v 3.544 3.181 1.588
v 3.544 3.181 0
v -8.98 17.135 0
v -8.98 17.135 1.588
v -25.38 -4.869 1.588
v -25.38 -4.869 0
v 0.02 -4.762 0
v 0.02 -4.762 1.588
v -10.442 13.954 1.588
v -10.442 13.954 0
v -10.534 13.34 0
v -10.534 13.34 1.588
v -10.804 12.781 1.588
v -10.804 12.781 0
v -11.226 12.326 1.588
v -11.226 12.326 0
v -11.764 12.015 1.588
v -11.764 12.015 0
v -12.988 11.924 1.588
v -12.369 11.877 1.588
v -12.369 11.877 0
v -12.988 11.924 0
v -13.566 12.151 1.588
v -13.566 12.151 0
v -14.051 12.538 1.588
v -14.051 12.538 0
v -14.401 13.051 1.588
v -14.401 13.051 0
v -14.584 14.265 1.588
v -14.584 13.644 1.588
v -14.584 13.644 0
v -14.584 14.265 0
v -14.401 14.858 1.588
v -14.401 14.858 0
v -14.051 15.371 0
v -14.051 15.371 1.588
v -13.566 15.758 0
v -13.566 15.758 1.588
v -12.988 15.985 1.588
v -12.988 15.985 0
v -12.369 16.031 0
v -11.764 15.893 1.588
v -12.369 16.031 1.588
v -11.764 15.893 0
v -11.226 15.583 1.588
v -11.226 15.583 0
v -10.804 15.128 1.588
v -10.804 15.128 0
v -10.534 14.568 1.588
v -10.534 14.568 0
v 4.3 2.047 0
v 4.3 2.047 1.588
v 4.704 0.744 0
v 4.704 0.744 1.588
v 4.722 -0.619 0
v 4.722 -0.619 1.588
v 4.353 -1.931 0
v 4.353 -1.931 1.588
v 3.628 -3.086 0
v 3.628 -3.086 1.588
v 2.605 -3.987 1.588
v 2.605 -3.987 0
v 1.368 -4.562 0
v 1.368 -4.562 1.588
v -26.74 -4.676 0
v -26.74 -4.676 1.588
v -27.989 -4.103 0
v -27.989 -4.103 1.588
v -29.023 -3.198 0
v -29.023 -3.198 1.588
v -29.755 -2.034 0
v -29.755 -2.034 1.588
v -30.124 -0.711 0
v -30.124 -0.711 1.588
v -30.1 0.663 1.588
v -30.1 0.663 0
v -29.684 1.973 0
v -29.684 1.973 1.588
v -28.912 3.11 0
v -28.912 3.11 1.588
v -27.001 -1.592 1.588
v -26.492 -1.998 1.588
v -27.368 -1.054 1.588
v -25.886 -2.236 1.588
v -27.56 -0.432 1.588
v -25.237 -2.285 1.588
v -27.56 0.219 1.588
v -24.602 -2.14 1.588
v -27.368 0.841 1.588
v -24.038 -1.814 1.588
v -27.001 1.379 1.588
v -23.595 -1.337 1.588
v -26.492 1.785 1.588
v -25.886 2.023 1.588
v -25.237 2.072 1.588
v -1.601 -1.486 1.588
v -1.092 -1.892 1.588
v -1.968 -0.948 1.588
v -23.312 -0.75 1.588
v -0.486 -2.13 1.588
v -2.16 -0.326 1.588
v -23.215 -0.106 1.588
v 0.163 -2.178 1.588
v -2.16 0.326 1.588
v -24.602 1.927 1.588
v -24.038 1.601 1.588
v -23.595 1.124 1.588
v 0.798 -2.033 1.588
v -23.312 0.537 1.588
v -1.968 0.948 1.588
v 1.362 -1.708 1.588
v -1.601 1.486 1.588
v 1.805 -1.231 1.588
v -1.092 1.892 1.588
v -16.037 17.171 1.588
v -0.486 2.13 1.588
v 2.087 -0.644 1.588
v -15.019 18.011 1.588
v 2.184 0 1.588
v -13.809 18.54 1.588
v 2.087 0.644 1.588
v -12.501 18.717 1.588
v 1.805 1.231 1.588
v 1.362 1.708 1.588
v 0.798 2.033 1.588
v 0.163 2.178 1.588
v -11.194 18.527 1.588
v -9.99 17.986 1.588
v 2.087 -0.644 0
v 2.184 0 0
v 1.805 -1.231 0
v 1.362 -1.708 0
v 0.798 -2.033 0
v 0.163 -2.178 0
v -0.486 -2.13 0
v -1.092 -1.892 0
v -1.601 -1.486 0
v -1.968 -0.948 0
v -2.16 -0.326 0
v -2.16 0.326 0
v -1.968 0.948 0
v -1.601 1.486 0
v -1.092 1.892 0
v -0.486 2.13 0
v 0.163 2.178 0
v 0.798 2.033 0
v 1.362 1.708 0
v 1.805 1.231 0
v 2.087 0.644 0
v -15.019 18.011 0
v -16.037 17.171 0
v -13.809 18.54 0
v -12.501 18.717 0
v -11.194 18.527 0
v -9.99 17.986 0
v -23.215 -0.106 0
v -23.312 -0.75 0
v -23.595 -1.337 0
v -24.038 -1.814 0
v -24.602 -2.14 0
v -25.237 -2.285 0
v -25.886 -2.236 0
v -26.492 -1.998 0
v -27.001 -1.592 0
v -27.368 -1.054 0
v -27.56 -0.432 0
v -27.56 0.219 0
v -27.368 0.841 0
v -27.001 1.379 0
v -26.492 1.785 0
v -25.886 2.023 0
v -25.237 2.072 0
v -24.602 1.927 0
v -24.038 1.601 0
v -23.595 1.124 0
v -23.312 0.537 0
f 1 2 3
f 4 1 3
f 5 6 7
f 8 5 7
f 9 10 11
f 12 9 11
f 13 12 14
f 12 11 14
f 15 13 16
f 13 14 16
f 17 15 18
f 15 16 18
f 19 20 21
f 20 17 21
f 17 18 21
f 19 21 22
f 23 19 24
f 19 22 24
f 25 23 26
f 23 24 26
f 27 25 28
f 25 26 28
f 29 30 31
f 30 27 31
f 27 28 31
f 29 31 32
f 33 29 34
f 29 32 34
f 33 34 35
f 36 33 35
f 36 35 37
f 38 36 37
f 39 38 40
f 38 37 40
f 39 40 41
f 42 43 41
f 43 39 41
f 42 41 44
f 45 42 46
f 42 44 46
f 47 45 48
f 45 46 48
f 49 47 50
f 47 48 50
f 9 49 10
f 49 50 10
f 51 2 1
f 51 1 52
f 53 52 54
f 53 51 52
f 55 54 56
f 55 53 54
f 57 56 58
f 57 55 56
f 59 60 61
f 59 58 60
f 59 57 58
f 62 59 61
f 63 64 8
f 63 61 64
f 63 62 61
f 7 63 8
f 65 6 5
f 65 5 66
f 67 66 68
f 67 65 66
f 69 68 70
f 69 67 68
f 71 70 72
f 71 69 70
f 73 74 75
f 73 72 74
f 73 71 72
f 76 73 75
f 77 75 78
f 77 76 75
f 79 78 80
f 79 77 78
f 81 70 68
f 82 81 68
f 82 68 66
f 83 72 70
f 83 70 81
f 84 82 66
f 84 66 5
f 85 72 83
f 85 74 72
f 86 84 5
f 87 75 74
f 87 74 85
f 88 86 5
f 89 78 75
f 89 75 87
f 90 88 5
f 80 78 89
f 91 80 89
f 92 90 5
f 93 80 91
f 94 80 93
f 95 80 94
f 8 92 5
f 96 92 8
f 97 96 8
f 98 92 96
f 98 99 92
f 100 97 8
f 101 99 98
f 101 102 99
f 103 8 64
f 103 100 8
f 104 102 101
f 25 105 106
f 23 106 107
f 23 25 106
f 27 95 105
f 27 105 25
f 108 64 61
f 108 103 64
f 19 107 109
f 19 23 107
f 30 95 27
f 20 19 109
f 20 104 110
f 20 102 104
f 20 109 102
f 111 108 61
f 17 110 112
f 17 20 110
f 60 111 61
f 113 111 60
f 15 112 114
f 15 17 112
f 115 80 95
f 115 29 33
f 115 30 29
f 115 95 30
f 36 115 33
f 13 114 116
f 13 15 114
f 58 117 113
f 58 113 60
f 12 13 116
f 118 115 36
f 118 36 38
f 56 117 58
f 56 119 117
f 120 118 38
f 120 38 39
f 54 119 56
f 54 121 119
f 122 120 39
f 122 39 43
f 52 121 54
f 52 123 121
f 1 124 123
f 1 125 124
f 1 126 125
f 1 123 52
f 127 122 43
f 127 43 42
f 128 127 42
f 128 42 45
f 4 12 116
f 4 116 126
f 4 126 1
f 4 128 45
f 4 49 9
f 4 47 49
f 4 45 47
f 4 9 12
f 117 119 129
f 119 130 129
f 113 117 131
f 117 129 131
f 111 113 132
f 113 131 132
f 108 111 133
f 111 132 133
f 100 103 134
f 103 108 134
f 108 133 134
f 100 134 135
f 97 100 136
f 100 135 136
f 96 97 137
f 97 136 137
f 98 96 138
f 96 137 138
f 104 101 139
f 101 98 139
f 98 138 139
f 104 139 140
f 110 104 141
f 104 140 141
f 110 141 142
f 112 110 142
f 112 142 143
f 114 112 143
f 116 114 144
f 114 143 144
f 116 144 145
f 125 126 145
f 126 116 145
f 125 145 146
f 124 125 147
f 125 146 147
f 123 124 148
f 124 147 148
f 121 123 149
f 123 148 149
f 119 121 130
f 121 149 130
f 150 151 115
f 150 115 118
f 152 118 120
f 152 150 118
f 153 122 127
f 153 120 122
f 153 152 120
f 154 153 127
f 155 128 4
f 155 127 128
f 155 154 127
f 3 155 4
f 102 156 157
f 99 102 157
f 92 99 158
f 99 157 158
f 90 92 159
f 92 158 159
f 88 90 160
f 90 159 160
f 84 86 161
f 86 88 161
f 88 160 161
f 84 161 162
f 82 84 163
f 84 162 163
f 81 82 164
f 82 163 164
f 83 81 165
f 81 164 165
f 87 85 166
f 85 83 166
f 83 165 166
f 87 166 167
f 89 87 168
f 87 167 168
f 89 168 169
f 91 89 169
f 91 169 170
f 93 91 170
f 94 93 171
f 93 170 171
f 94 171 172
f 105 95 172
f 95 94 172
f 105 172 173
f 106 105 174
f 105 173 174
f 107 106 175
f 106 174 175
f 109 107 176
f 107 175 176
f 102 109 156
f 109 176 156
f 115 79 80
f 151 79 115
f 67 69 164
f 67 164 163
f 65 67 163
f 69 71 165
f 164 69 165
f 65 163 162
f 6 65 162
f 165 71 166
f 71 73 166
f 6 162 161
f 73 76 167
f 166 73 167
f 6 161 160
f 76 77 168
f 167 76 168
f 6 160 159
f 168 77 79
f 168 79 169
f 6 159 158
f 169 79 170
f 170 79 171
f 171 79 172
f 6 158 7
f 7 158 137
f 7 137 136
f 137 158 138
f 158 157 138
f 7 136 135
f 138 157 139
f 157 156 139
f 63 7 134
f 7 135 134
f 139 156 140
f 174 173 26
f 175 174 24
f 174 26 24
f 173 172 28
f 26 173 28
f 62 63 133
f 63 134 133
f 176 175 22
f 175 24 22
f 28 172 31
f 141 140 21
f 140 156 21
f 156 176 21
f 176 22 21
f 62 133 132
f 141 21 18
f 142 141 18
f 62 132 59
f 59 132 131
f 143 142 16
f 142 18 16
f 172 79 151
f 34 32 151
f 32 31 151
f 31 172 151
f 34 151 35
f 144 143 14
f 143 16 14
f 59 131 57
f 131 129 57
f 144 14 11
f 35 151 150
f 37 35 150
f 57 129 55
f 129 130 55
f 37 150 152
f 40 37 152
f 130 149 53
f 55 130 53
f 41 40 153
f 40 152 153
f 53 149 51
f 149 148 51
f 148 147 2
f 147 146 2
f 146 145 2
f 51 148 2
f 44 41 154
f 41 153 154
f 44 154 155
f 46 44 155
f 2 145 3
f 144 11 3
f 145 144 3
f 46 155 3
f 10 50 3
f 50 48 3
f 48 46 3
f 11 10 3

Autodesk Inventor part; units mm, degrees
ref_plane "YZ Plane" through (0, 0, 0) normal (1, 0, 0) x (0, 1, 0)
ref_plane "XZ Plane" through (0, 0, 0) normal (0, 1, 0) x (-1, 0, 0)
ref_plane "XY Plane" through (0, 0, 0) normal (0, 0, 1) x (1, 0, 0)
sketch "main" plane through (0, 0, 0) normal (0, 0, 1) x (1, 0, 0)
  circle A0 centre (4.313, -2.5933) radius 2.0828
  circle A1 centre (17.2471, 11.4133) radius 2.1844
  circle A2 centre (-8.1529, 11.4133) radius 2.1844
  arc A3 (-8.1529, 16.1758) -> (-11.7104, 8.2471) centre (-8.1529, 11.4133) ccw
  arc A4 (20.746, 8.1824) -> (17.2471, 16.1758) centre (17.2471, 11.4133) ccw
  arc A5 (0.7554, -5.7596) -> (7.8119, -5.8243) centre (4.313, -2.5933) ccw
  line L0 (20.746, 8.1824) -> (7.8119, -5.8243)
  line L1 (17.2471, 16.1758) -> (-8.1529, 16.1758)
  line L2 (-11.7104, 8.2471) -> (0.7554, -5.7596)
  point P0 (4.4691, 6.7444)
  dimension "d0" = 4.1656
  dimension "d1" = 9.525
  dimension "d2" = 9.525
  dimension "d3" = 9.525
sketch "Sketch1" plane through (0, 0, 0) normal (0, 0, 1) x (1, 0, 0)
  circle A0 centre (-12.5245, 13.9543) radius 2.0828
  circle A1 centre (-25.3998, -0.1065) radius 2.1844
  circle A2 centre (0, 0) radius 2.1844
  arc A3 (0.02, -4.7625) -> (3.5443, 3.1811) centre (0, 0) ccw
  arc A4 (-28.9122, 3.1098) -> (-25.3798, -4.8689) centre (-25.3998, -0.1065) ccw
  arc A5 (-8.9802, 17.1354) -> (-16.0369, 17.1706) centre (-12.5245, 13.9543) ccw
  line L0 (-28.9122, 3.1098) -> (-16.0369, 17.1706)
  line L1 (-25.3798, -4.8689) -> (0.02, -4.7625)
  line L2 (3.5443, 3.1811) -> (-8.9802, 17.1354)
  point P0 (0, 0)
extrude "Extrusion1" add sketch "Sketch1" along normal blind 1.5875
properties part number "brace_gusset" material "Acetal Resin, White"
